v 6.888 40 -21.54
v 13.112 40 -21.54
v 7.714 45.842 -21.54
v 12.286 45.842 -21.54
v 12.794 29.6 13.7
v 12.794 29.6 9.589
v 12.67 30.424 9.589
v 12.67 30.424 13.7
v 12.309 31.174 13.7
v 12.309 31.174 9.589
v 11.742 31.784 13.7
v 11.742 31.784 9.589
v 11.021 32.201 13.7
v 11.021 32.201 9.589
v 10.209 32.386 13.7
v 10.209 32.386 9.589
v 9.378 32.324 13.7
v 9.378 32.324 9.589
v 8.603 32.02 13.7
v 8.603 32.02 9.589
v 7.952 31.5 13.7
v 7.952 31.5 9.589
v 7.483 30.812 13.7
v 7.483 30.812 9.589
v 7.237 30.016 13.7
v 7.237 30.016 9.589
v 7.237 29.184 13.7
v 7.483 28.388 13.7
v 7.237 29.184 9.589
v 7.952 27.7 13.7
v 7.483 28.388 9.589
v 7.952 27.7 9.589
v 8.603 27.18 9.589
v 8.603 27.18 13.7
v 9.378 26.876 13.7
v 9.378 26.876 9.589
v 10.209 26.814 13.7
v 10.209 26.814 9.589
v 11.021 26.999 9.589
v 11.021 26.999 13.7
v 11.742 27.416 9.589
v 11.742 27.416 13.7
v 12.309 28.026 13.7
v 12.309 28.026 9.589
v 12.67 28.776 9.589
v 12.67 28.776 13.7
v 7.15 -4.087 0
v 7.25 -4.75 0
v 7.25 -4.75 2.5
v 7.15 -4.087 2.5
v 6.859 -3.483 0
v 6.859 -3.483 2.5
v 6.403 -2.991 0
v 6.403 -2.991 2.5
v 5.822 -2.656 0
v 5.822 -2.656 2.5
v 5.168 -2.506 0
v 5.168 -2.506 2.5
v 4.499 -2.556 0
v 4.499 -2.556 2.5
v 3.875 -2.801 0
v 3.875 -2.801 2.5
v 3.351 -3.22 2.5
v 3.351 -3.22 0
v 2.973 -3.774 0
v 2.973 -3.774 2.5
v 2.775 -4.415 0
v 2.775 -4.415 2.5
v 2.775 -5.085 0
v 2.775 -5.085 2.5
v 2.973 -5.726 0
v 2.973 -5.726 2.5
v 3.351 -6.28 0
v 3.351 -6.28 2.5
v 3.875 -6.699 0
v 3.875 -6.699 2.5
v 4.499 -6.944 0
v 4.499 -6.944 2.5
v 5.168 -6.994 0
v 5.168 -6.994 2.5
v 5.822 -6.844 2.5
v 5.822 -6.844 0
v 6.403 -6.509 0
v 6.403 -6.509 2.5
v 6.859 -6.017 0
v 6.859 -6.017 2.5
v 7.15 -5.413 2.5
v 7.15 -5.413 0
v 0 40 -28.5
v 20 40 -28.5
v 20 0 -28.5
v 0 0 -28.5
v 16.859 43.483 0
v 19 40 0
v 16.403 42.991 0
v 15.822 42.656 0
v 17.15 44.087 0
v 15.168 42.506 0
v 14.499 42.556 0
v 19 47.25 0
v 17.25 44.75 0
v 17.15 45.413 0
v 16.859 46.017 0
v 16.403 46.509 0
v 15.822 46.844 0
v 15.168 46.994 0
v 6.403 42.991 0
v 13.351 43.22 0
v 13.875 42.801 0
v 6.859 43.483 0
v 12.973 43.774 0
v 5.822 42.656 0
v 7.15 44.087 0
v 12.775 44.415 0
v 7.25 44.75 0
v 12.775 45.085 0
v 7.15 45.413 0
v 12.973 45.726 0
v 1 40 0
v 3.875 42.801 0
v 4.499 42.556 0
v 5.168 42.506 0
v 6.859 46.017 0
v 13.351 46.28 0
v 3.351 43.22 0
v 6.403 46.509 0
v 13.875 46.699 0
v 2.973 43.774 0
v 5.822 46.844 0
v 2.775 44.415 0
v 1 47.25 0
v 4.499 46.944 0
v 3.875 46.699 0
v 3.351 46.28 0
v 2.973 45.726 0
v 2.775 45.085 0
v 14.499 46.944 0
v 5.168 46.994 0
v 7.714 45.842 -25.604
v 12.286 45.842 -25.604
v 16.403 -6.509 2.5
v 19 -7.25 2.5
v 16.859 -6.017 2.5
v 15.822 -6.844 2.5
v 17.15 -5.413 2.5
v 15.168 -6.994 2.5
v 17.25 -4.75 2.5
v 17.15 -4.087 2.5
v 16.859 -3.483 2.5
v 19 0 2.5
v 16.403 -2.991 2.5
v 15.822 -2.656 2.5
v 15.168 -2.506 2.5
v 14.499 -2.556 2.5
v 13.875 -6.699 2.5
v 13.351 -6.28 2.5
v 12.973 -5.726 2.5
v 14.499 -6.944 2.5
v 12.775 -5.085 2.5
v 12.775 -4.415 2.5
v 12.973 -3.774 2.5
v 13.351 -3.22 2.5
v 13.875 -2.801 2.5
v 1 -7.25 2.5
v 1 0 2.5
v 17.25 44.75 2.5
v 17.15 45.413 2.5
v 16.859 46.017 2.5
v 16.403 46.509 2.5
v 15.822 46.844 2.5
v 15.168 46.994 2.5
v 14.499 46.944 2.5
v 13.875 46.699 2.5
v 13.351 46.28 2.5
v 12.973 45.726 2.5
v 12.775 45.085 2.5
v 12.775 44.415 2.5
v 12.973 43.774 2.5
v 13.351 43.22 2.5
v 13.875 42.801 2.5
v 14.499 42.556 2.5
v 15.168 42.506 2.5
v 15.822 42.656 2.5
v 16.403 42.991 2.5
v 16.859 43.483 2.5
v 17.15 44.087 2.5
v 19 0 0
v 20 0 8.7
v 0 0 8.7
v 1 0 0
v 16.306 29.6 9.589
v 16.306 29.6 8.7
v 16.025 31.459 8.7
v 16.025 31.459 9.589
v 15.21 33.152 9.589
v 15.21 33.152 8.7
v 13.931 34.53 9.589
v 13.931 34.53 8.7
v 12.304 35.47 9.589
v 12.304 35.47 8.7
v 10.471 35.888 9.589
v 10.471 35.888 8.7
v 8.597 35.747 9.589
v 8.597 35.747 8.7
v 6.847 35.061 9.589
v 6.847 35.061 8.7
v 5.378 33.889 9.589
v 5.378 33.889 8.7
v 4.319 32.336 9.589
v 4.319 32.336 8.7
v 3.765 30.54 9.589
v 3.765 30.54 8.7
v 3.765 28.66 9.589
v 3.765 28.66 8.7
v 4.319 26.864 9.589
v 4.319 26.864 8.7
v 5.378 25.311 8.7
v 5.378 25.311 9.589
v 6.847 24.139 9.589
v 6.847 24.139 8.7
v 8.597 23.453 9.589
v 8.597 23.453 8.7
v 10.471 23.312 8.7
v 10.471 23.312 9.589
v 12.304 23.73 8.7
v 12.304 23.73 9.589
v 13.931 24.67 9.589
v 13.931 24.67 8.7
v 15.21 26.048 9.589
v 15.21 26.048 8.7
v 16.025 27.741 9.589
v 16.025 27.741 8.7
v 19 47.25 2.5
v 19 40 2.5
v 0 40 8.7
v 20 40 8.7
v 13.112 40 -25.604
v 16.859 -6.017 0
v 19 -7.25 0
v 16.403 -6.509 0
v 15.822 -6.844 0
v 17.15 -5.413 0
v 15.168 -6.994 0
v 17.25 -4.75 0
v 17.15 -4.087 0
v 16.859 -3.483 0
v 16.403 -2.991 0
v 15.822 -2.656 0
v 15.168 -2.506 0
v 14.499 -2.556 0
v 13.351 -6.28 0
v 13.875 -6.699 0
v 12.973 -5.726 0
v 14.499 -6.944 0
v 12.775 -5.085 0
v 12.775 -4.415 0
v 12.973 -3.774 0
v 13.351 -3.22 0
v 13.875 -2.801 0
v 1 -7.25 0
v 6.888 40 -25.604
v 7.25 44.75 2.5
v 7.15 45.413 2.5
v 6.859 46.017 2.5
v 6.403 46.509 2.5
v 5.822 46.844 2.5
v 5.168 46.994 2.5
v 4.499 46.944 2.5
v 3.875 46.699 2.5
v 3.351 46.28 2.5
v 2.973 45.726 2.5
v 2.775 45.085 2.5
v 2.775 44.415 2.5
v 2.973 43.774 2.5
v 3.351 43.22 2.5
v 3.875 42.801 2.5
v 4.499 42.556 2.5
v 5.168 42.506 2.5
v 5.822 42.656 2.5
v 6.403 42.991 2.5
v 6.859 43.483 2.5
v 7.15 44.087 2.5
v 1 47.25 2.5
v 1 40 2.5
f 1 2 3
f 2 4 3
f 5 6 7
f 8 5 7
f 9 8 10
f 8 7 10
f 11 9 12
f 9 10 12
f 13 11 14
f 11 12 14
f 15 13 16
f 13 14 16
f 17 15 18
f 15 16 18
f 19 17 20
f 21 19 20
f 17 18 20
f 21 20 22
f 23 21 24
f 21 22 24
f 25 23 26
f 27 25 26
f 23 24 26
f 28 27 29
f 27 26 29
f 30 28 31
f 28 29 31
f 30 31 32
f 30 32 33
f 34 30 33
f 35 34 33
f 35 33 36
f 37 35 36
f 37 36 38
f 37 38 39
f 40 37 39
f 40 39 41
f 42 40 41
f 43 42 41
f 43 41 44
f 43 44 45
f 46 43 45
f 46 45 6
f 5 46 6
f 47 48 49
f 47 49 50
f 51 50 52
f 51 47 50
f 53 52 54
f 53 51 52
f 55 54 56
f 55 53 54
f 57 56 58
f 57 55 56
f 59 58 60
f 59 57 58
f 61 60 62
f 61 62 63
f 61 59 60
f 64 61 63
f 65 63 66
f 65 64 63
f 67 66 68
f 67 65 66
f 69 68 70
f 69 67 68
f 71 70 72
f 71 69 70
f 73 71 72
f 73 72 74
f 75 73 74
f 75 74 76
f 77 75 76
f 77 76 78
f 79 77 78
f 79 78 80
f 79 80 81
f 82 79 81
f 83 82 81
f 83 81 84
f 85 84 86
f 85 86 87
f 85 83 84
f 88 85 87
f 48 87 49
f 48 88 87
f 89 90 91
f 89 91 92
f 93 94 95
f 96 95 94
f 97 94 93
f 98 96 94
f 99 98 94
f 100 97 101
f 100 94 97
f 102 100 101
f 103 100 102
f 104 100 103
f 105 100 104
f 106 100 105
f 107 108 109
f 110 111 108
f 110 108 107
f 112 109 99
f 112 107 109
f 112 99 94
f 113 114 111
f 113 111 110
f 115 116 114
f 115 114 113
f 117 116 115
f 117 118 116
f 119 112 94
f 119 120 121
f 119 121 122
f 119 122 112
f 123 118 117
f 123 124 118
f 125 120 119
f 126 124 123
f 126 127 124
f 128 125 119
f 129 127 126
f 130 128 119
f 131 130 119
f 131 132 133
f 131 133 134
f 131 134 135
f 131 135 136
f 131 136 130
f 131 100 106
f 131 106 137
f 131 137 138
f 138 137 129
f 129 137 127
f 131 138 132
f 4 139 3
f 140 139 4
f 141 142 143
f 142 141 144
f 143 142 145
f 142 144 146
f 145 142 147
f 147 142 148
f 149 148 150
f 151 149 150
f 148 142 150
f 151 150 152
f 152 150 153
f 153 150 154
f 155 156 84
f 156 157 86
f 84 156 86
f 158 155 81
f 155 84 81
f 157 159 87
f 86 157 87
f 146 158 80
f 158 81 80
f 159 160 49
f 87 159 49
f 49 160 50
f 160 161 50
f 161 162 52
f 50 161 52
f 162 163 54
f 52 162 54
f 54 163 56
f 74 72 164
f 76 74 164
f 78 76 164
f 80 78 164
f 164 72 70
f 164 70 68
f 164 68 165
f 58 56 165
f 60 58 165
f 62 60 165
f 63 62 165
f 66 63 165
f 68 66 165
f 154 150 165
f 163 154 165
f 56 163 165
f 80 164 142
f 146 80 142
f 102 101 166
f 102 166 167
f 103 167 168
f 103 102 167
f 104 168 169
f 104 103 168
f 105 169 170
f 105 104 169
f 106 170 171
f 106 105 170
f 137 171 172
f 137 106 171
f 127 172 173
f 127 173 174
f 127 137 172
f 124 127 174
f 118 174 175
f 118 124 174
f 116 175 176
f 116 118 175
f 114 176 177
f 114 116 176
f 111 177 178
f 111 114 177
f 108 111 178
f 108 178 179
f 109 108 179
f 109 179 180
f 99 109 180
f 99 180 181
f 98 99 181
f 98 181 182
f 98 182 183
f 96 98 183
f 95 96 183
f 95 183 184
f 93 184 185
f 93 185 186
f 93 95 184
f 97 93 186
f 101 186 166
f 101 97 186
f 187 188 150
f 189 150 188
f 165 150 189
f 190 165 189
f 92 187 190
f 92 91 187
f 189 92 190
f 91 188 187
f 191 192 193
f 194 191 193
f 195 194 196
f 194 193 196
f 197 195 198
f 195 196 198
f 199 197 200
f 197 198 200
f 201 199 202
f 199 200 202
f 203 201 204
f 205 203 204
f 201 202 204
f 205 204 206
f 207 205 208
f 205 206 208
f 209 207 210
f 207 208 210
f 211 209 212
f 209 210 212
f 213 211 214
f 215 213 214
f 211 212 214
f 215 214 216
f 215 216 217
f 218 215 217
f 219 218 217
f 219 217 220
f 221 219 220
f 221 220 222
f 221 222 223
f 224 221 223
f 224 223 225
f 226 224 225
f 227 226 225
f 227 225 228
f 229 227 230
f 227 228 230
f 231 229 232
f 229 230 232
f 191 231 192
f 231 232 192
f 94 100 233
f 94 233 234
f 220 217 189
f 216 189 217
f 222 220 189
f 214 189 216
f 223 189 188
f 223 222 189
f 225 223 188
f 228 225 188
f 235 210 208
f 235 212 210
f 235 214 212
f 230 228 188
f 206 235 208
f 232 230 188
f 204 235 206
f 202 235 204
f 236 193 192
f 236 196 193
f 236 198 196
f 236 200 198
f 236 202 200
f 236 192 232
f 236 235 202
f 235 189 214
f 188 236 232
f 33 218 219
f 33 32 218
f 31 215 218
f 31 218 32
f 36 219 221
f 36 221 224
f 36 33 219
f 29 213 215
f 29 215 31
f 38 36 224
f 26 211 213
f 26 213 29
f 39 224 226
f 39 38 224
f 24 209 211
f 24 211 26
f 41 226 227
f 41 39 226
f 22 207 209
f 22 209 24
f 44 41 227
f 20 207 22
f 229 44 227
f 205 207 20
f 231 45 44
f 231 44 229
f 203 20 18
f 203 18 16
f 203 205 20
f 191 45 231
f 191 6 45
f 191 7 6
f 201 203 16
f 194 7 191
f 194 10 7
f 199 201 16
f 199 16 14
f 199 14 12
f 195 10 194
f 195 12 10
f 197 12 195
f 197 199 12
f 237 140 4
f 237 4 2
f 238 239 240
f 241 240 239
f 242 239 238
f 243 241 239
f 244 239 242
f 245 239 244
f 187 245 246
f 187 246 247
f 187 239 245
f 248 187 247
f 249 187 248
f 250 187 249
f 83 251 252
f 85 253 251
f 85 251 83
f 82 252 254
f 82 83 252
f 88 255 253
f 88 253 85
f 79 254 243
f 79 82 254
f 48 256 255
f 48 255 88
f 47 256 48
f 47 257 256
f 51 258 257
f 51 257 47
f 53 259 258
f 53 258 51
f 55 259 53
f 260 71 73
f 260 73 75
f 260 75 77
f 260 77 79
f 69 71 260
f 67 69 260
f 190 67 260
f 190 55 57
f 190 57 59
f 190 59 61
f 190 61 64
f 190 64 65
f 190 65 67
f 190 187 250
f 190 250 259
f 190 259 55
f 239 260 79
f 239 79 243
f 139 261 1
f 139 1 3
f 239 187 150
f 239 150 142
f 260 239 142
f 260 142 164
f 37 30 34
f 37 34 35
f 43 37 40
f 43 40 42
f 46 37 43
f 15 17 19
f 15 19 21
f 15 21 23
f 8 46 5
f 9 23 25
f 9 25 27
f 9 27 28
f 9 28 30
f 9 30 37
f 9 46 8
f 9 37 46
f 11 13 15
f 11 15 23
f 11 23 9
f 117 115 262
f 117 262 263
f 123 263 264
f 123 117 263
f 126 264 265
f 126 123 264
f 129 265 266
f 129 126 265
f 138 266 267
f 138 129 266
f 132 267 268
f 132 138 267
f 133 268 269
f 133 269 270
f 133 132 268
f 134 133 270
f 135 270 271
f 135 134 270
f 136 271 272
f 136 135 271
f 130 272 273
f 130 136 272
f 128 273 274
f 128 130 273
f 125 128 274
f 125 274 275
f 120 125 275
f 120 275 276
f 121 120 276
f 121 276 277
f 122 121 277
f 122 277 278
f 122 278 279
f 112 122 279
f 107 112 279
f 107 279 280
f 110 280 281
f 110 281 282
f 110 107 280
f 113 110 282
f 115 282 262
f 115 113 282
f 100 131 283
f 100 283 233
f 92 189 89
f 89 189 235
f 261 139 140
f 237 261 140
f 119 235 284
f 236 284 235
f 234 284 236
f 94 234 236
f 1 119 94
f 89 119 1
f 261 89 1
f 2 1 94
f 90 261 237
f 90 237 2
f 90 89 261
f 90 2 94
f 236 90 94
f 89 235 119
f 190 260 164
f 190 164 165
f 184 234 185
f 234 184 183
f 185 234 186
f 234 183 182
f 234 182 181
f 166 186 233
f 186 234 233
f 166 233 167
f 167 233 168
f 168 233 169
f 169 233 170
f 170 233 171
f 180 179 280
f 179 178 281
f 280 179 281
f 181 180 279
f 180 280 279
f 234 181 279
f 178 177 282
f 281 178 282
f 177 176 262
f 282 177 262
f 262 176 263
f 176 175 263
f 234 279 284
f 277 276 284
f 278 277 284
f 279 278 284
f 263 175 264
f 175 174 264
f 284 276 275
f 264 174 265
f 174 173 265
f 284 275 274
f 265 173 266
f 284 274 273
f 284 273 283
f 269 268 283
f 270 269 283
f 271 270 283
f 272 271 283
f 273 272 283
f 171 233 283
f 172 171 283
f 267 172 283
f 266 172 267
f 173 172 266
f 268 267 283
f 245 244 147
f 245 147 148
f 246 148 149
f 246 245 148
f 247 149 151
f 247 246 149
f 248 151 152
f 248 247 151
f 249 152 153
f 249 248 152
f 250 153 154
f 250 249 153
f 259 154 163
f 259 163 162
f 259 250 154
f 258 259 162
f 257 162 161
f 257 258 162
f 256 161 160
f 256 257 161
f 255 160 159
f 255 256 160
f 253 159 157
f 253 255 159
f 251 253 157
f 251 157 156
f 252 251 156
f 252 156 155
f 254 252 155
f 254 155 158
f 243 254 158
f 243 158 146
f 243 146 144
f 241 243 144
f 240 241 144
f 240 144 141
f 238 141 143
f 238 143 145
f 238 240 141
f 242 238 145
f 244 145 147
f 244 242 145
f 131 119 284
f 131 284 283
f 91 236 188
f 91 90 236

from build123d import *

# Parameters (mm, degrees)
SKETCH1_W           = 20
SKETCH1_H           = 40
BOSS_EXTRUDE1_DEPTH = 8.7
SKETCH2_W           = 20
SKETCH2_H           = 40
BOSS_EXTRUDE2_DEPTH = 28.5
SKETCH3_R           = 2.25
BOSS_EXTRUDE3_DEPTH = 2.5
SKETCH4_R           = 2.794
BOSS_EXTRUDE4_DEPTH = 5
BOSS_EXTRUDE6_DEPTH = 6.9596
SKETCH10_R          = 6.30555
BOSS_EXTRUDE7_DEPTH = 0.889
CUT_EXTRUDE1_DEPTH  = 2.8956


with BuildPart() as part:
    # Sketch1 → Boss-Extrude1 (new body)
    with BuildSketch(Plane.XY):
        with Locations((10, 20)):
            Rectangle(SKETCH1_W, SKETCH1_H)
    extrude(amount=BOSS_EXTRUDE1_DEPTH)

    # Sketch2 → Boss-Extrude2 (add)
    with BuildSketch(Plane(origin=(0, 0, 0), x_dir=(-1, 0, 0), z_dir=(0, 0, -1))):
        with Locations((-10, 20)):
            Rectangle(SKETCH2_W, SKETCH2_H)
    extrude(amount=BOSS_EXTRUDE2_DEPTH)

    # Sketch3 → Boss-Extrude3 (add)
    with BuildSketch(Plane.XY):
        Polygon((19, 0), (19, -7.25), (1, -7.25), (1, 0), (0, 0), (0, 40), (1, 40), (1, 47.25), (19, 47.25), (19, 40), (20, 40), (20, 0), align=None)
        with Locations((5, -4.75)):
            Circle(SKETCH3_R, mode=Mode.SUBTRACT)
        with Locations((15, -4.75)):
            Circle(SKETCH3_R, mode=Mode.SUBTRACT)
        with Locations((5, 44.75)):
            Circle(SKETCH3_R, mode=Mode.SUBTRACT)
        with Locations((15, 44.75)):
            Circle(SKETCH3_R, mode=Mode.SUBTRACT)
    extrude(amount=BOSS_EXTRUDE3_DEPTH)

    # Sketch4 → Boss-Extrude4 (add)
    with BuildSketch(Plane.XY.offset(8.7)):
        with Locations((10, 29.6)):
            Circle(SKETCH4_R)
    extrude(amount=BOSS_EXTRUDE4_DEPTH)

    # Sketch9 → Boss-Extrude6 (add)
    with BuildSketch(Plane(origin=(0, 0, -28.5), x_dir=(-1, 0, 0), z_dir=(0, 0, -1))):
        Polygon((-13.1115, 40), (-6.8885, 40), (-7.714, 45.842), (-12.286, 45.842), align=None)
    extrude(amount=-BOSS_EXTRUDE6_DEPTH)

    # Sketch10 → Boss-Extrude7 (add)
    with BuildSketch(Plane.XY.offset(8.7)):
        with Locations((10, 29.6)):
            Circle(SKETCH10_R)
    extrude(amount=BOSS_EXTRUDE7_DEPTH)

    # Sketch11 → Cut-Extrude1 (cut)
    with BuildSketch(Plane(origin=(0, 0, -28.5), x_dir=(-1, 0, 0), z_dir=(0, 0, -1))):
        Polygon((-12.286, 45.842), (-7.714, 45.842), (-6.8885, 40), (-13.1115, 40), align=None)
    extrude(amount=-CUT_EXTRUDE1_DEPTH, mode=Mode.SUBTRACT)


solid = part.part
